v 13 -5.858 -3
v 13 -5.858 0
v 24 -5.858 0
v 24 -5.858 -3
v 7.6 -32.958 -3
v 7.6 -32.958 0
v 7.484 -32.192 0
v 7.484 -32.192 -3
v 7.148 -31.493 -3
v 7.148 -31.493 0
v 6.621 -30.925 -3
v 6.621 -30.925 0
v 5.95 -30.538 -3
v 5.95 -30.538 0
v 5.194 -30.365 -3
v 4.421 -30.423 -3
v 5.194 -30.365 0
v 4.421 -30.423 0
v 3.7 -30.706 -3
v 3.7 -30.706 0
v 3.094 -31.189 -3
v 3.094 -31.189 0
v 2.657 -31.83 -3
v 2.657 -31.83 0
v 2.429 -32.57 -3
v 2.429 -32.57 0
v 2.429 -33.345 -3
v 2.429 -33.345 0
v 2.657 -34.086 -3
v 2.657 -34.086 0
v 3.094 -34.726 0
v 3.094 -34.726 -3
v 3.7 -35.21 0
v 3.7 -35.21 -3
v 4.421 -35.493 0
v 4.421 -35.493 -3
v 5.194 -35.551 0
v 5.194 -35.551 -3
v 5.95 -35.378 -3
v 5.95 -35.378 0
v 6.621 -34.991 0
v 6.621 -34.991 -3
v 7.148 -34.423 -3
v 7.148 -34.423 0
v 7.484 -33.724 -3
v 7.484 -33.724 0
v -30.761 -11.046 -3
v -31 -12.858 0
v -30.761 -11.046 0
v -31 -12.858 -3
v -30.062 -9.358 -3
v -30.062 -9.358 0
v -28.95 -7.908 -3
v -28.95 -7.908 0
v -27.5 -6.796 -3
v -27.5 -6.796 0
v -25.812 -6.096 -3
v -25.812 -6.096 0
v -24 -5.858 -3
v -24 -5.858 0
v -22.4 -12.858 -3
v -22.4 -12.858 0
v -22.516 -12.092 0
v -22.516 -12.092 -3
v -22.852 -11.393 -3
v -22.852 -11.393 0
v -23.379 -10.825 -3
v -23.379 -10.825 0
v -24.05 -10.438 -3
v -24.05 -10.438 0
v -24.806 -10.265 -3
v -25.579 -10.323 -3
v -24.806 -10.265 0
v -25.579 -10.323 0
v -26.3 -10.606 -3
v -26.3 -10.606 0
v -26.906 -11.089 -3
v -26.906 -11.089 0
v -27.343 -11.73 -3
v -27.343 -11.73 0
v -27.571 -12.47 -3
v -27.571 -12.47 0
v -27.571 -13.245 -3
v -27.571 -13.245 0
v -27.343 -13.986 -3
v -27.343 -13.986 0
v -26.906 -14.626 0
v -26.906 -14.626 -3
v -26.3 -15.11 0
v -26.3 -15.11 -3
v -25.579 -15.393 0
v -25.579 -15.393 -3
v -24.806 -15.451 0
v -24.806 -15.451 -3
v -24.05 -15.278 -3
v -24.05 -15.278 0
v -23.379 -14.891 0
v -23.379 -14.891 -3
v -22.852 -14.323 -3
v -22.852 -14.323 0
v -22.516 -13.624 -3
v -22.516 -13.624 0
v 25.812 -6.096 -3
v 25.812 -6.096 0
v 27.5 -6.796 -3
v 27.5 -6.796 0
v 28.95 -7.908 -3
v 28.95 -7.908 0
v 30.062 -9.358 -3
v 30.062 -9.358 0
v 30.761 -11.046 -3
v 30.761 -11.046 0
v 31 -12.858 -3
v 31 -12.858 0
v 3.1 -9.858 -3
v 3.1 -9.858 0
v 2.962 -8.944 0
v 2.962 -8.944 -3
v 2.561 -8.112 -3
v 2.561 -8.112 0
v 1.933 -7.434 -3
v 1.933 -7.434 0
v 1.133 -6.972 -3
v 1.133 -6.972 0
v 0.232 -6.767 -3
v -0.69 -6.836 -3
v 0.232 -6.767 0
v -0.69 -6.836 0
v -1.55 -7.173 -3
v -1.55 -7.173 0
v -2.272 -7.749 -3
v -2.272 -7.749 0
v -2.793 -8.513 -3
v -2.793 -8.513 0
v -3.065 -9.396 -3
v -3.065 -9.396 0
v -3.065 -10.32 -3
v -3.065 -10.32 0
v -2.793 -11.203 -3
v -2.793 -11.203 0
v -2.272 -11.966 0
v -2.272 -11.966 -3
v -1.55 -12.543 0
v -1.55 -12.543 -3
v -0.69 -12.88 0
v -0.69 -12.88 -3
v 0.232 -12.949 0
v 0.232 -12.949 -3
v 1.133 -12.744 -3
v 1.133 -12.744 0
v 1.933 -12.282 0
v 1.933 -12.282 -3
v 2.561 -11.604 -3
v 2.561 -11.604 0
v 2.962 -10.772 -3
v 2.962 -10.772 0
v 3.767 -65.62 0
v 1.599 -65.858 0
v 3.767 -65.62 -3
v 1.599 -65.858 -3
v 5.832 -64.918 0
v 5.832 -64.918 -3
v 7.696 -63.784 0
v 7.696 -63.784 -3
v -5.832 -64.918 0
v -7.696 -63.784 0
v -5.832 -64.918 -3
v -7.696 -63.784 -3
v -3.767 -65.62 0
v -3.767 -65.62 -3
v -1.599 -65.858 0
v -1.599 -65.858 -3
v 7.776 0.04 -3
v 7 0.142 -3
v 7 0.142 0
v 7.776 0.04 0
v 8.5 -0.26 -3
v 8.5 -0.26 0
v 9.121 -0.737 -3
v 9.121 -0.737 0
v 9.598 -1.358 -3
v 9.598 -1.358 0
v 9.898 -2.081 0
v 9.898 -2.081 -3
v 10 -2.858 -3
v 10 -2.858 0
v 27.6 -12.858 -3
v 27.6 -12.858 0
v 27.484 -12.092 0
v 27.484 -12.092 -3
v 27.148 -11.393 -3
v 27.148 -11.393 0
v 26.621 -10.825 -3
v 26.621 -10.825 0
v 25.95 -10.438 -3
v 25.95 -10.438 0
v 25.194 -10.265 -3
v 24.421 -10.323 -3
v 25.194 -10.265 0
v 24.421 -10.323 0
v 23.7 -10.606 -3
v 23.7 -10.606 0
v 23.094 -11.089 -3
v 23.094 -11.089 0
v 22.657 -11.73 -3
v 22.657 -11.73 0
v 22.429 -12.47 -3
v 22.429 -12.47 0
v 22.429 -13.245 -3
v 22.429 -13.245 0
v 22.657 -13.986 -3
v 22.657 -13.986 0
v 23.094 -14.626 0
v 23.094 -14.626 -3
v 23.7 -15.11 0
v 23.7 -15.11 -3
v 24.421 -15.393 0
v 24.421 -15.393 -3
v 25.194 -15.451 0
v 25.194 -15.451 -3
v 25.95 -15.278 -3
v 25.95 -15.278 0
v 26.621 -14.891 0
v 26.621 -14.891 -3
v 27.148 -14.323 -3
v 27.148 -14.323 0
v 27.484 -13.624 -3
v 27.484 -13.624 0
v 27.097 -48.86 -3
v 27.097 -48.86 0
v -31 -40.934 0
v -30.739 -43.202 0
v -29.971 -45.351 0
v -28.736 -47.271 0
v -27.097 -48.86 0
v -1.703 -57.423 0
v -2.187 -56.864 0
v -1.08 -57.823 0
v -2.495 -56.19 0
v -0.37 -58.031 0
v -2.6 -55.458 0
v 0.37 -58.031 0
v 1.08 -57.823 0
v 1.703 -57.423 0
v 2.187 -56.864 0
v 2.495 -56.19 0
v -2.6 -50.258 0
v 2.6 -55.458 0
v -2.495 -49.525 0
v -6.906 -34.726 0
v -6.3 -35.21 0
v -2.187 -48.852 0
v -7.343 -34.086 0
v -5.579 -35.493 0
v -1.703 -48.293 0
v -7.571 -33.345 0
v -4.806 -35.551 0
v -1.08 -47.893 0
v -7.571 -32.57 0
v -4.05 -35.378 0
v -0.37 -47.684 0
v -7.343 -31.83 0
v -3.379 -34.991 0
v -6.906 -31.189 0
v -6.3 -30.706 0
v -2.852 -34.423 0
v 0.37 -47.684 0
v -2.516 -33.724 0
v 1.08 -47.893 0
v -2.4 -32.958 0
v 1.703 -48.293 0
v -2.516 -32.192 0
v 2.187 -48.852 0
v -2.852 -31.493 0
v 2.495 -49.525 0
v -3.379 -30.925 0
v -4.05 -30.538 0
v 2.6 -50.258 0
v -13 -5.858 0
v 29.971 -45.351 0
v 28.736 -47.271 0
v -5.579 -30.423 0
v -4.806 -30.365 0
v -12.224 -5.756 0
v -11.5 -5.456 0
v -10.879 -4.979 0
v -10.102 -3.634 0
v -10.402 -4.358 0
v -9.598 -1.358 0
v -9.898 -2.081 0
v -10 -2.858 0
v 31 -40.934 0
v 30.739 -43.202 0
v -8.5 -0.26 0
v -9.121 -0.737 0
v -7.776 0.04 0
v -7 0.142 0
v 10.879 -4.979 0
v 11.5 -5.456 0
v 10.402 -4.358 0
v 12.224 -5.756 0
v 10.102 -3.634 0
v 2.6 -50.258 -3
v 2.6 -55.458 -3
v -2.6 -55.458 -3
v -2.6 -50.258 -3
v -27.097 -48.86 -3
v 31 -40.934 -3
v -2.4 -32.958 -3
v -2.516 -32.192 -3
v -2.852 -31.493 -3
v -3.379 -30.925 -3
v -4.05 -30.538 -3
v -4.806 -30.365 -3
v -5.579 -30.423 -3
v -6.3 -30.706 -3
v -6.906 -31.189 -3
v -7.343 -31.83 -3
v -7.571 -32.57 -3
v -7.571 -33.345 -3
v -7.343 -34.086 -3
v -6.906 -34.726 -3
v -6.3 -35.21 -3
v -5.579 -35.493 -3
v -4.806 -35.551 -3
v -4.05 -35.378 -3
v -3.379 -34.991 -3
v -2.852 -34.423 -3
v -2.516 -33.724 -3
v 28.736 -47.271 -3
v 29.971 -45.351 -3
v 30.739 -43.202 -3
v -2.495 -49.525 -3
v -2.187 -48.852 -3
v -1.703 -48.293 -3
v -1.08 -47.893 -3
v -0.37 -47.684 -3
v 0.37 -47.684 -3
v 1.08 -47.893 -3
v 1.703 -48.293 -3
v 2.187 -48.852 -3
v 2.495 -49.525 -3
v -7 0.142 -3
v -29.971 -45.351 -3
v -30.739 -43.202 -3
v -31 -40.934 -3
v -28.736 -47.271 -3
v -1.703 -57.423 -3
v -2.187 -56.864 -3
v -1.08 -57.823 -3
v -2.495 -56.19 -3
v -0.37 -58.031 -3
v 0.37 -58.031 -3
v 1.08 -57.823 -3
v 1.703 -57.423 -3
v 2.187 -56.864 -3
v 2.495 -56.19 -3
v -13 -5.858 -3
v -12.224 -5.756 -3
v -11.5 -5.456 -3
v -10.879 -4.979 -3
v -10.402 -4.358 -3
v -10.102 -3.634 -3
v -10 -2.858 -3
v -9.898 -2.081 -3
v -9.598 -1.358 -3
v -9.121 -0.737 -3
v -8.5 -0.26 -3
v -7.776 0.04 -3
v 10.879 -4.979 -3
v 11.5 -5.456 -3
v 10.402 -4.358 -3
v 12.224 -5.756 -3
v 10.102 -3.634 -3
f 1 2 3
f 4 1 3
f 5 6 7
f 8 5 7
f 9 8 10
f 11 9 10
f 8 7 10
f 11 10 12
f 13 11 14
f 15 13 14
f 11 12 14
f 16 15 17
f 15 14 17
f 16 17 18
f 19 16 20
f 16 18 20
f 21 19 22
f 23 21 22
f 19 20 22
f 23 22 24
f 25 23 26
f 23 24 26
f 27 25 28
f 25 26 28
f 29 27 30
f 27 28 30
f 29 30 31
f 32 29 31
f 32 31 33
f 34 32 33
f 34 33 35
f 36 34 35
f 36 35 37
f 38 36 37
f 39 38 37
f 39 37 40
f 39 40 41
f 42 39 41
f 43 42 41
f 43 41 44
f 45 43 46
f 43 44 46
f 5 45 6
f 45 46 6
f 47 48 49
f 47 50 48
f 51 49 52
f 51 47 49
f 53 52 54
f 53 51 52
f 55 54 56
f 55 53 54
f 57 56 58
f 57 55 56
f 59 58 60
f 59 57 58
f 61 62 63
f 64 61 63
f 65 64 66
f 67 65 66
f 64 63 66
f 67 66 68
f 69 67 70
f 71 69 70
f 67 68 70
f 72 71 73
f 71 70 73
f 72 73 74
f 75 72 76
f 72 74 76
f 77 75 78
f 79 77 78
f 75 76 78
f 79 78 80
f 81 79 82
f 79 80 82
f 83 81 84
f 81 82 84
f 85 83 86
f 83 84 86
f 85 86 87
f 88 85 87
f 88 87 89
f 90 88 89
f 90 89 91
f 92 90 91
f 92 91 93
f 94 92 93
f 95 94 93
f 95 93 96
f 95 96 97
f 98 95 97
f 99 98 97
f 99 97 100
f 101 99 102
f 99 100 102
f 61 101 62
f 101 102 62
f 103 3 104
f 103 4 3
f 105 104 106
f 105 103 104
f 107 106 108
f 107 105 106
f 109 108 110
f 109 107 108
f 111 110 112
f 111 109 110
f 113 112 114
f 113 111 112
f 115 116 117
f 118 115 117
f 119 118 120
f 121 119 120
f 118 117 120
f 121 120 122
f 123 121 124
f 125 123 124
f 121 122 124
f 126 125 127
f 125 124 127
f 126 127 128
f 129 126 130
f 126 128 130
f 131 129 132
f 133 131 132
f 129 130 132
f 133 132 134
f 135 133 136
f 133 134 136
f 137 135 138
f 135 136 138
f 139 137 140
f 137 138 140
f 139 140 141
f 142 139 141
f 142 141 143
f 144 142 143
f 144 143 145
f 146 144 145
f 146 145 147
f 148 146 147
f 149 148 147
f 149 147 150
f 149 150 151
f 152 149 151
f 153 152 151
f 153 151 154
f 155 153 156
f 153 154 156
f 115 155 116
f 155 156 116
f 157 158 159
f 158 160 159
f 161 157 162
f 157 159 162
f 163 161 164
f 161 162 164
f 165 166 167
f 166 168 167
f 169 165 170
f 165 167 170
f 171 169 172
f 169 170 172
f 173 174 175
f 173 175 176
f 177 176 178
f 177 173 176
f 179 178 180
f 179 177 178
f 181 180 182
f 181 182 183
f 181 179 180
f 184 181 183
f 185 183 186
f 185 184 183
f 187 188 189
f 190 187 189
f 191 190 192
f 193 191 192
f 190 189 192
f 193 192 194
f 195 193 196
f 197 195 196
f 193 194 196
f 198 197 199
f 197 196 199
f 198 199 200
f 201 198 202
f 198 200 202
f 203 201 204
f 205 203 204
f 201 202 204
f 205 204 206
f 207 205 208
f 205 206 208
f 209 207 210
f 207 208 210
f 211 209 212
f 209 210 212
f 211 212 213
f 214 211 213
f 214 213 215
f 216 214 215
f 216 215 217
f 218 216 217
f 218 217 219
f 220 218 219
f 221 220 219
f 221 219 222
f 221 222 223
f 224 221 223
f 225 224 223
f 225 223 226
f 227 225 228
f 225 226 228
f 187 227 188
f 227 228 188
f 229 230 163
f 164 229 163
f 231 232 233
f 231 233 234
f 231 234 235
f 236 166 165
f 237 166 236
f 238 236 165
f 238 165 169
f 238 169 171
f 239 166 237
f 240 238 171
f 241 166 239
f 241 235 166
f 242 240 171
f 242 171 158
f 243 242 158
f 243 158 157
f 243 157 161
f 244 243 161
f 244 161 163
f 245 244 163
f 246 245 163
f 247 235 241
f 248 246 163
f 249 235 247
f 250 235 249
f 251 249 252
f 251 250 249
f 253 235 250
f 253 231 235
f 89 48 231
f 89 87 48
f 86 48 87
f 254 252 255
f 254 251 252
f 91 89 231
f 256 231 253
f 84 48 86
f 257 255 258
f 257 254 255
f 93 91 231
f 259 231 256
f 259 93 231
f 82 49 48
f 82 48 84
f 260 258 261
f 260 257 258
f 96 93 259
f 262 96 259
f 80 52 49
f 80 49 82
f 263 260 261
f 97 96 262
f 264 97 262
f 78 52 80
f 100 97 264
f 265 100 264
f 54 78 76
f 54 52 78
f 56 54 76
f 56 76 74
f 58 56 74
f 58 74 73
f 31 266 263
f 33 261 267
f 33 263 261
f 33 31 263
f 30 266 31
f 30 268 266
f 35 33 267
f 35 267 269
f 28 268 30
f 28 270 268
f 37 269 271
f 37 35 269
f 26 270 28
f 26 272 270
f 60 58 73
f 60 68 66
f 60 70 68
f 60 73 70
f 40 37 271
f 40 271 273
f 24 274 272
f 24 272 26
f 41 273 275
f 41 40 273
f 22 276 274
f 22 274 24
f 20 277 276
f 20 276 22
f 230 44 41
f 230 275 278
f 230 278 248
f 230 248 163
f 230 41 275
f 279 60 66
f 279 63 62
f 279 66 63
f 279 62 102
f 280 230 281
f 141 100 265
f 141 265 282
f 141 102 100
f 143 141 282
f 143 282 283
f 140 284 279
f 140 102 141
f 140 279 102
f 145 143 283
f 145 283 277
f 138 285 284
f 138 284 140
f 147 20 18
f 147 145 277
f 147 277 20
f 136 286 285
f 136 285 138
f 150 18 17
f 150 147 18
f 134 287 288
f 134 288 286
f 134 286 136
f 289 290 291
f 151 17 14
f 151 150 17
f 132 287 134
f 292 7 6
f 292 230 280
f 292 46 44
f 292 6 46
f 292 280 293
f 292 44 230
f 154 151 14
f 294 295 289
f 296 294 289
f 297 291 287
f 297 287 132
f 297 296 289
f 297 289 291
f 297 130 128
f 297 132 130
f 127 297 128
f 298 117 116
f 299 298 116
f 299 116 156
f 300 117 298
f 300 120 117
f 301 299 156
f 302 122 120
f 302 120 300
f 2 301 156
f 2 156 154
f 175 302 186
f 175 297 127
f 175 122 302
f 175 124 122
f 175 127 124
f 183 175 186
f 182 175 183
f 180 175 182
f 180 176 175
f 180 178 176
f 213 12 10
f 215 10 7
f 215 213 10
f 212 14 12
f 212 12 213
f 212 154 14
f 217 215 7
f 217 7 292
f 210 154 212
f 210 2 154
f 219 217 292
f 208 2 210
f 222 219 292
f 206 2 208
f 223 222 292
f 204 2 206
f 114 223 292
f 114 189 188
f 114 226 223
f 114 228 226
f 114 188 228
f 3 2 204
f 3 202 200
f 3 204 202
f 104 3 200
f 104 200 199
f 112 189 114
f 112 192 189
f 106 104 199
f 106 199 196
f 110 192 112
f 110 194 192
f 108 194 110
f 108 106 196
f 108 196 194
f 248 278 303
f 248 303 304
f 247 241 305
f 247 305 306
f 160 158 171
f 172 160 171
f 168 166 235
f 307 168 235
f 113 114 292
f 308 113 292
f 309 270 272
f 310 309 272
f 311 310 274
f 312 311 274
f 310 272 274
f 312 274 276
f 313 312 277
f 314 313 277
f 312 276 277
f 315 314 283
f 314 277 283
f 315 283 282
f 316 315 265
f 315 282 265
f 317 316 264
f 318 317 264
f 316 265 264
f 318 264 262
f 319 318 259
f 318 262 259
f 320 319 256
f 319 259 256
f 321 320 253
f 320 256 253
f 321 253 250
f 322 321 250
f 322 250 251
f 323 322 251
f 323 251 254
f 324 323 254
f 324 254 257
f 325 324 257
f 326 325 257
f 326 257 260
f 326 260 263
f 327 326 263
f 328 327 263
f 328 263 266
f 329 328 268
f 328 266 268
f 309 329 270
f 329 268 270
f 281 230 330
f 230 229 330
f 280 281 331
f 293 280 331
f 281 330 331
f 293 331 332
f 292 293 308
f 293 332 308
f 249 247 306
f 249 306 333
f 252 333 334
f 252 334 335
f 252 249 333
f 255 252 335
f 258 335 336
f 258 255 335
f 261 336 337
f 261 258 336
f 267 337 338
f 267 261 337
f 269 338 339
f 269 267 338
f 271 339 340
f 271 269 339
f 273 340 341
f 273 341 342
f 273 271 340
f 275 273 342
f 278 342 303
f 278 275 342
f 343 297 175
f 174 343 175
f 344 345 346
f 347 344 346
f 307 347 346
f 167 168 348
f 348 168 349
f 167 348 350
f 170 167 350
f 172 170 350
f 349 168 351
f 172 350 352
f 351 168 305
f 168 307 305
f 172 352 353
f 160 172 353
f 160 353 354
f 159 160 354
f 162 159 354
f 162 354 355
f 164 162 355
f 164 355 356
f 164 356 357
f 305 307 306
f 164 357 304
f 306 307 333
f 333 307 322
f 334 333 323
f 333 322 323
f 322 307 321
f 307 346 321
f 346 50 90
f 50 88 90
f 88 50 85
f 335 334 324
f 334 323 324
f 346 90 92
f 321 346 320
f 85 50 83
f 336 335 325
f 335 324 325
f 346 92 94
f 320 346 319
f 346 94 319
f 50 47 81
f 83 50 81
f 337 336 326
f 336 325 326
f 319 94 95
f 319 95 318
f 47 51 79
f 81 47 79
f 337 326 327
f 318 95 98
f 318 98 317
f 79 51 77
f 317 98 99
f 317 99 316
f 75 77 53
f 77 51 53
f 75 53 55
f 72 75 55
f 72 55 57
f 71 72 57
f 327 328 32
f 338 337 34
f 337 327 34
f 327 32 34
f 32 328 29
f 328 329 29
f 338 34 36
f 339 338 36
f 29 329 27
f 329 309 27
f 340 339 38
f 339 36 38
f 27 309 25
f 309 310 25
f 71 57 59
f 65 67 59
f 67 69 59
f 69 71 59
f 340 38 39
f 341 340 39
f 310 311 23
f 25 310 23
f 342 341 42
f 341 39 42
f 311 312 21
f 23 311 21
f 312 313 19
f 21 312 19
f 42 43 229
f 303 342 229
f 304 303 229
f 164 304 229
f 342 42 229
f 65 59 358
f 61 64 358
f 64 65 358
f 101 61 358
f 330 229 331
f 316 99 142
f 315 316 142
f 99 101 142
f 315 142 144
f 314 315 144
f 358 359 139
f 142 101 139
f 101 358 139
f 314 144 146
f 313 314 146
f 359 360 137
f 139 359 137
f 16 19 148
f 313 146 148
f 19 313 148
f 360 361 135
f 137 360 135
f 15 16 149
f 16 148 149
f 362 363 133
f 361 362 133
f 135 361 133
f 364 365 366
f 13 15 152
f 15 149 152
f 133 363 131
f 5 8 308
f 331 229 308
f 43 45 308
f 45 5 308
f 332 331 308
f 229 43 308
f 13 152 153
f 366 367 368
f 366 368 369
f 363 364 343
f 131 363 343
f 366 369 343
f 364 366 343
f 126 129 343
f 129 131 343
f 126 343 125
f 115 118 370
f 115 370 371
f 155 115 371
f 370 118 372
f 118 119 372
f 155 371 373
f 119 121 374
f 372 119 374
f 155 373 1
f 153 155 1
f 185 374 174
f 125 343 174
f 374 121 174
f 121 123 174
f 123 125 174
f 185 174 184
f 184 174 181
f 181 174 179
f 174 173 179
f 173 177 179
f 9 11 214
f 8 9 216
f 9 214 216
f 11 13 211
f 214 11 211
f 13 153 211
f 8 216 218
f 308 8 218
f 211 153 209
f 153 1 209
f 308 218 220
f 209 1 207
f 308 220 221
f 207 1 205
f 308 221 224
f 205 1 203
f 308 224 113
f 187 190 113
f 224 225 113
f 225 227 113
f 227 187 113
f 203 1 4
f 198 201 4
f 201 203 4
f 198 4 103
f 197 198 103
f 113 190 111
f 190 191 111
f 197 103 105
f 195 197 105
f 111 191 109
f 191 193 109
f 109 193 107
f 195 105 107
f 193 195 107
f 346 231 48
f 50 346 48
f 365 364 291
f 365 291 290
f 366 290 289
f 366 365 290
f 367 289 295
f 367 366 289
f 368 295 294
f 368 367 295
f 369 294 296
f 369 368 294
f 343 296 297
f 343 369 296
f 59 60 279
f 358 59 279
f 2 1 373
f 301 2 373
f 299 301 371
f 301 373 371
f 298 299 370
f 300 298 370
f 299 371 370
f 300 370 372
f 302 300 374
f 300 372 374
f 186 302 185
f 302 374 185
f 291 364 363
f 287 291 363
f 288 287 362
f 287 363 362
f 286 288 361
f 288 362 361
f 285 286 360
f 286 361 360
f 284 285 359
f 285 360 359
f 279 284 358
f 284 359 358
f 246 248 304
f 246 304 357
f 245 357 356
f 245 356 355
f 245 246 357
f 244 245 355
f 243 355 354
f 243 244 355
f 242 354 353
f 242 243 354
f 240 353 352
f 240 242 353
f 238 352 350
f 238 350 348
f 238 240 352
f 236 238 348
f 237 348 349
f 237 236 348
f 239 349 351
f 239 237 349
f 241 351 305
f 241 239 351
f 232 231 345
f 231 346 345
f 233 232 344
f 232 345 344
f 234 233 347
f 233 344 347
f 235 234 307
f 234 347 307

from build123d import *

# Parameters (mm, degrees)
SKETCH1_R          = 2.6
SKETCH1_R_2        = 3.1
BASE_FLANGE1_DEPTH = 3
FILLET_10_MM_R     = 10
FILLET1_R          = 7
FILLET2_START      = -4
FILLET2_DEPTH      = 5
FILLET2_START_2    = -3
FILLET2_2_DEPTH    = 3


with BuildPart() as part:
    # Base-Flange1: sheet metal written as solids
    # Sketch1 → Base-Flange1 (new body)
    with BuildSketch(Plane.XY):
        Polygon((-31, -5.857930586), (-10, -5.857930586), (-10, 0.142069414), (10, 0.142069414), (10, -5.857930586), (31, -5.857930586), (31, -45.857930586), (5, -65.857930586), (-5, -65.857930586), (-31, -45.857930586), align=None)
        with Locations((25, -12.857930586)):
            Circle(SKETCH1_R, mode=Mode.SUBTRACT)
        with Locations((-25, -12.857930586)):
            Circle(SKETCH1_R, mode=Mode.SUBTRACT)
        with Locations((0, -9.857930586)):
            Circle(SKETCH1_R_2, mode=Mode.SUBTRACT)
        with Locations((5, -32.957930586)):
            Circle(SKETCH1_R, mode=Mode.SUBTRACT)
        with Locations((-5, -32.957930586)):
            Circle(SKETCH1_R, mode=Mode.SUBTRACT)
        with BuildLine():
            Line((-2.6, -55.457930586), (-2.6, -50.257930586))
            ThreePointArc((-2.6, -50.257930586), (0, -47.657930586), (2.6, -50.257930586))
            Line((2.6, -50.257930586), (2.6, -55.457930586))
            ThreePointArc((2.6, -55.457930586), (0, -58.057930586), (-2.6, -55.457930586))
        make_face(mode=Mode.SUBTRACT)
    extrude(amount=-BASE_FLANGE1_DEPTH)

    # fillet 10 mm
    fillet_10_mm_edges = [part.edges().sort_by_distance(p)[0] for p in [
        (31, -45.857930586, -1.5),
        (5, -65.857930586, -1.5),
        (-5, -65.857930586, -1.5),
        (-31, -45.857930586, -1.5),
    ]]
    fillet(fillet_10_mm_edges, radius=FILLET_10_MM_R)

    # Fillet1
    fillet1_edges = [part.edges().sort_by_distance(p)[0] for p in [
        (31, -5.857930586, -1.5),
        (-31, -5.857930586, -1.5),
    ]]
    fillet(fillet1_edges, radius=FILLET1_R)

    # Fillet2: read off the stored shape, not the designer's step
    # Fillet2 outline → Fillet2 (cut)
    with BuildSketch(Plane.XY.offset(FILLET2_START)):
        with BuildLine():
            Line((-10, 0.142069414), (-10, -2.857930586))
            ThreePointArc((-10, -2.857930586), (-9.121320344, -0.736610242), (-7, 0.142069414))
            Line((-7, 0.142069414), (-10, 0.142069414))
        make_face()
        with BuildLine():
            Line((10, 0.142069414), (7, 0.142069414))
            ThreePointArc((7, 0.142069414), (9.121320344, -0.736610242), (10, -2.857930586))
            Line((10, -2.857930586), (10, 0.142069414))
        make_face()
    extrude(amount=FILLET2_DEPTH, mode=Mode.SUBTRACT)

    # Fillet2 2 outline → Fillet2 2 (add)
    with BuildSketch(Plane.XY.offset(FILLET2_START_2)):
        with BuildLine():
            Line((-10, -5.857930586), (-10, -2.857930586))
            ThreePointArc((-10, -2.857930586), (-10.878679656, -4.97925093), (-13, -5.857930586))
            Line((-13, -5.857930586), (-10, -5.857930586))
        make_face()
        with BuildLine():
            ThreePointArc((13, -5.857930586), (10.878679656, -4.97925093), (10, -2.857930586))
            Line((10, -2.857930586), (10, -5.857930586))
            Line((10, -5.857930586), (13, -5.857930586))
        make_face()
    extrude(amount=FILLET2_2_DEPTH)


solid = part.part
